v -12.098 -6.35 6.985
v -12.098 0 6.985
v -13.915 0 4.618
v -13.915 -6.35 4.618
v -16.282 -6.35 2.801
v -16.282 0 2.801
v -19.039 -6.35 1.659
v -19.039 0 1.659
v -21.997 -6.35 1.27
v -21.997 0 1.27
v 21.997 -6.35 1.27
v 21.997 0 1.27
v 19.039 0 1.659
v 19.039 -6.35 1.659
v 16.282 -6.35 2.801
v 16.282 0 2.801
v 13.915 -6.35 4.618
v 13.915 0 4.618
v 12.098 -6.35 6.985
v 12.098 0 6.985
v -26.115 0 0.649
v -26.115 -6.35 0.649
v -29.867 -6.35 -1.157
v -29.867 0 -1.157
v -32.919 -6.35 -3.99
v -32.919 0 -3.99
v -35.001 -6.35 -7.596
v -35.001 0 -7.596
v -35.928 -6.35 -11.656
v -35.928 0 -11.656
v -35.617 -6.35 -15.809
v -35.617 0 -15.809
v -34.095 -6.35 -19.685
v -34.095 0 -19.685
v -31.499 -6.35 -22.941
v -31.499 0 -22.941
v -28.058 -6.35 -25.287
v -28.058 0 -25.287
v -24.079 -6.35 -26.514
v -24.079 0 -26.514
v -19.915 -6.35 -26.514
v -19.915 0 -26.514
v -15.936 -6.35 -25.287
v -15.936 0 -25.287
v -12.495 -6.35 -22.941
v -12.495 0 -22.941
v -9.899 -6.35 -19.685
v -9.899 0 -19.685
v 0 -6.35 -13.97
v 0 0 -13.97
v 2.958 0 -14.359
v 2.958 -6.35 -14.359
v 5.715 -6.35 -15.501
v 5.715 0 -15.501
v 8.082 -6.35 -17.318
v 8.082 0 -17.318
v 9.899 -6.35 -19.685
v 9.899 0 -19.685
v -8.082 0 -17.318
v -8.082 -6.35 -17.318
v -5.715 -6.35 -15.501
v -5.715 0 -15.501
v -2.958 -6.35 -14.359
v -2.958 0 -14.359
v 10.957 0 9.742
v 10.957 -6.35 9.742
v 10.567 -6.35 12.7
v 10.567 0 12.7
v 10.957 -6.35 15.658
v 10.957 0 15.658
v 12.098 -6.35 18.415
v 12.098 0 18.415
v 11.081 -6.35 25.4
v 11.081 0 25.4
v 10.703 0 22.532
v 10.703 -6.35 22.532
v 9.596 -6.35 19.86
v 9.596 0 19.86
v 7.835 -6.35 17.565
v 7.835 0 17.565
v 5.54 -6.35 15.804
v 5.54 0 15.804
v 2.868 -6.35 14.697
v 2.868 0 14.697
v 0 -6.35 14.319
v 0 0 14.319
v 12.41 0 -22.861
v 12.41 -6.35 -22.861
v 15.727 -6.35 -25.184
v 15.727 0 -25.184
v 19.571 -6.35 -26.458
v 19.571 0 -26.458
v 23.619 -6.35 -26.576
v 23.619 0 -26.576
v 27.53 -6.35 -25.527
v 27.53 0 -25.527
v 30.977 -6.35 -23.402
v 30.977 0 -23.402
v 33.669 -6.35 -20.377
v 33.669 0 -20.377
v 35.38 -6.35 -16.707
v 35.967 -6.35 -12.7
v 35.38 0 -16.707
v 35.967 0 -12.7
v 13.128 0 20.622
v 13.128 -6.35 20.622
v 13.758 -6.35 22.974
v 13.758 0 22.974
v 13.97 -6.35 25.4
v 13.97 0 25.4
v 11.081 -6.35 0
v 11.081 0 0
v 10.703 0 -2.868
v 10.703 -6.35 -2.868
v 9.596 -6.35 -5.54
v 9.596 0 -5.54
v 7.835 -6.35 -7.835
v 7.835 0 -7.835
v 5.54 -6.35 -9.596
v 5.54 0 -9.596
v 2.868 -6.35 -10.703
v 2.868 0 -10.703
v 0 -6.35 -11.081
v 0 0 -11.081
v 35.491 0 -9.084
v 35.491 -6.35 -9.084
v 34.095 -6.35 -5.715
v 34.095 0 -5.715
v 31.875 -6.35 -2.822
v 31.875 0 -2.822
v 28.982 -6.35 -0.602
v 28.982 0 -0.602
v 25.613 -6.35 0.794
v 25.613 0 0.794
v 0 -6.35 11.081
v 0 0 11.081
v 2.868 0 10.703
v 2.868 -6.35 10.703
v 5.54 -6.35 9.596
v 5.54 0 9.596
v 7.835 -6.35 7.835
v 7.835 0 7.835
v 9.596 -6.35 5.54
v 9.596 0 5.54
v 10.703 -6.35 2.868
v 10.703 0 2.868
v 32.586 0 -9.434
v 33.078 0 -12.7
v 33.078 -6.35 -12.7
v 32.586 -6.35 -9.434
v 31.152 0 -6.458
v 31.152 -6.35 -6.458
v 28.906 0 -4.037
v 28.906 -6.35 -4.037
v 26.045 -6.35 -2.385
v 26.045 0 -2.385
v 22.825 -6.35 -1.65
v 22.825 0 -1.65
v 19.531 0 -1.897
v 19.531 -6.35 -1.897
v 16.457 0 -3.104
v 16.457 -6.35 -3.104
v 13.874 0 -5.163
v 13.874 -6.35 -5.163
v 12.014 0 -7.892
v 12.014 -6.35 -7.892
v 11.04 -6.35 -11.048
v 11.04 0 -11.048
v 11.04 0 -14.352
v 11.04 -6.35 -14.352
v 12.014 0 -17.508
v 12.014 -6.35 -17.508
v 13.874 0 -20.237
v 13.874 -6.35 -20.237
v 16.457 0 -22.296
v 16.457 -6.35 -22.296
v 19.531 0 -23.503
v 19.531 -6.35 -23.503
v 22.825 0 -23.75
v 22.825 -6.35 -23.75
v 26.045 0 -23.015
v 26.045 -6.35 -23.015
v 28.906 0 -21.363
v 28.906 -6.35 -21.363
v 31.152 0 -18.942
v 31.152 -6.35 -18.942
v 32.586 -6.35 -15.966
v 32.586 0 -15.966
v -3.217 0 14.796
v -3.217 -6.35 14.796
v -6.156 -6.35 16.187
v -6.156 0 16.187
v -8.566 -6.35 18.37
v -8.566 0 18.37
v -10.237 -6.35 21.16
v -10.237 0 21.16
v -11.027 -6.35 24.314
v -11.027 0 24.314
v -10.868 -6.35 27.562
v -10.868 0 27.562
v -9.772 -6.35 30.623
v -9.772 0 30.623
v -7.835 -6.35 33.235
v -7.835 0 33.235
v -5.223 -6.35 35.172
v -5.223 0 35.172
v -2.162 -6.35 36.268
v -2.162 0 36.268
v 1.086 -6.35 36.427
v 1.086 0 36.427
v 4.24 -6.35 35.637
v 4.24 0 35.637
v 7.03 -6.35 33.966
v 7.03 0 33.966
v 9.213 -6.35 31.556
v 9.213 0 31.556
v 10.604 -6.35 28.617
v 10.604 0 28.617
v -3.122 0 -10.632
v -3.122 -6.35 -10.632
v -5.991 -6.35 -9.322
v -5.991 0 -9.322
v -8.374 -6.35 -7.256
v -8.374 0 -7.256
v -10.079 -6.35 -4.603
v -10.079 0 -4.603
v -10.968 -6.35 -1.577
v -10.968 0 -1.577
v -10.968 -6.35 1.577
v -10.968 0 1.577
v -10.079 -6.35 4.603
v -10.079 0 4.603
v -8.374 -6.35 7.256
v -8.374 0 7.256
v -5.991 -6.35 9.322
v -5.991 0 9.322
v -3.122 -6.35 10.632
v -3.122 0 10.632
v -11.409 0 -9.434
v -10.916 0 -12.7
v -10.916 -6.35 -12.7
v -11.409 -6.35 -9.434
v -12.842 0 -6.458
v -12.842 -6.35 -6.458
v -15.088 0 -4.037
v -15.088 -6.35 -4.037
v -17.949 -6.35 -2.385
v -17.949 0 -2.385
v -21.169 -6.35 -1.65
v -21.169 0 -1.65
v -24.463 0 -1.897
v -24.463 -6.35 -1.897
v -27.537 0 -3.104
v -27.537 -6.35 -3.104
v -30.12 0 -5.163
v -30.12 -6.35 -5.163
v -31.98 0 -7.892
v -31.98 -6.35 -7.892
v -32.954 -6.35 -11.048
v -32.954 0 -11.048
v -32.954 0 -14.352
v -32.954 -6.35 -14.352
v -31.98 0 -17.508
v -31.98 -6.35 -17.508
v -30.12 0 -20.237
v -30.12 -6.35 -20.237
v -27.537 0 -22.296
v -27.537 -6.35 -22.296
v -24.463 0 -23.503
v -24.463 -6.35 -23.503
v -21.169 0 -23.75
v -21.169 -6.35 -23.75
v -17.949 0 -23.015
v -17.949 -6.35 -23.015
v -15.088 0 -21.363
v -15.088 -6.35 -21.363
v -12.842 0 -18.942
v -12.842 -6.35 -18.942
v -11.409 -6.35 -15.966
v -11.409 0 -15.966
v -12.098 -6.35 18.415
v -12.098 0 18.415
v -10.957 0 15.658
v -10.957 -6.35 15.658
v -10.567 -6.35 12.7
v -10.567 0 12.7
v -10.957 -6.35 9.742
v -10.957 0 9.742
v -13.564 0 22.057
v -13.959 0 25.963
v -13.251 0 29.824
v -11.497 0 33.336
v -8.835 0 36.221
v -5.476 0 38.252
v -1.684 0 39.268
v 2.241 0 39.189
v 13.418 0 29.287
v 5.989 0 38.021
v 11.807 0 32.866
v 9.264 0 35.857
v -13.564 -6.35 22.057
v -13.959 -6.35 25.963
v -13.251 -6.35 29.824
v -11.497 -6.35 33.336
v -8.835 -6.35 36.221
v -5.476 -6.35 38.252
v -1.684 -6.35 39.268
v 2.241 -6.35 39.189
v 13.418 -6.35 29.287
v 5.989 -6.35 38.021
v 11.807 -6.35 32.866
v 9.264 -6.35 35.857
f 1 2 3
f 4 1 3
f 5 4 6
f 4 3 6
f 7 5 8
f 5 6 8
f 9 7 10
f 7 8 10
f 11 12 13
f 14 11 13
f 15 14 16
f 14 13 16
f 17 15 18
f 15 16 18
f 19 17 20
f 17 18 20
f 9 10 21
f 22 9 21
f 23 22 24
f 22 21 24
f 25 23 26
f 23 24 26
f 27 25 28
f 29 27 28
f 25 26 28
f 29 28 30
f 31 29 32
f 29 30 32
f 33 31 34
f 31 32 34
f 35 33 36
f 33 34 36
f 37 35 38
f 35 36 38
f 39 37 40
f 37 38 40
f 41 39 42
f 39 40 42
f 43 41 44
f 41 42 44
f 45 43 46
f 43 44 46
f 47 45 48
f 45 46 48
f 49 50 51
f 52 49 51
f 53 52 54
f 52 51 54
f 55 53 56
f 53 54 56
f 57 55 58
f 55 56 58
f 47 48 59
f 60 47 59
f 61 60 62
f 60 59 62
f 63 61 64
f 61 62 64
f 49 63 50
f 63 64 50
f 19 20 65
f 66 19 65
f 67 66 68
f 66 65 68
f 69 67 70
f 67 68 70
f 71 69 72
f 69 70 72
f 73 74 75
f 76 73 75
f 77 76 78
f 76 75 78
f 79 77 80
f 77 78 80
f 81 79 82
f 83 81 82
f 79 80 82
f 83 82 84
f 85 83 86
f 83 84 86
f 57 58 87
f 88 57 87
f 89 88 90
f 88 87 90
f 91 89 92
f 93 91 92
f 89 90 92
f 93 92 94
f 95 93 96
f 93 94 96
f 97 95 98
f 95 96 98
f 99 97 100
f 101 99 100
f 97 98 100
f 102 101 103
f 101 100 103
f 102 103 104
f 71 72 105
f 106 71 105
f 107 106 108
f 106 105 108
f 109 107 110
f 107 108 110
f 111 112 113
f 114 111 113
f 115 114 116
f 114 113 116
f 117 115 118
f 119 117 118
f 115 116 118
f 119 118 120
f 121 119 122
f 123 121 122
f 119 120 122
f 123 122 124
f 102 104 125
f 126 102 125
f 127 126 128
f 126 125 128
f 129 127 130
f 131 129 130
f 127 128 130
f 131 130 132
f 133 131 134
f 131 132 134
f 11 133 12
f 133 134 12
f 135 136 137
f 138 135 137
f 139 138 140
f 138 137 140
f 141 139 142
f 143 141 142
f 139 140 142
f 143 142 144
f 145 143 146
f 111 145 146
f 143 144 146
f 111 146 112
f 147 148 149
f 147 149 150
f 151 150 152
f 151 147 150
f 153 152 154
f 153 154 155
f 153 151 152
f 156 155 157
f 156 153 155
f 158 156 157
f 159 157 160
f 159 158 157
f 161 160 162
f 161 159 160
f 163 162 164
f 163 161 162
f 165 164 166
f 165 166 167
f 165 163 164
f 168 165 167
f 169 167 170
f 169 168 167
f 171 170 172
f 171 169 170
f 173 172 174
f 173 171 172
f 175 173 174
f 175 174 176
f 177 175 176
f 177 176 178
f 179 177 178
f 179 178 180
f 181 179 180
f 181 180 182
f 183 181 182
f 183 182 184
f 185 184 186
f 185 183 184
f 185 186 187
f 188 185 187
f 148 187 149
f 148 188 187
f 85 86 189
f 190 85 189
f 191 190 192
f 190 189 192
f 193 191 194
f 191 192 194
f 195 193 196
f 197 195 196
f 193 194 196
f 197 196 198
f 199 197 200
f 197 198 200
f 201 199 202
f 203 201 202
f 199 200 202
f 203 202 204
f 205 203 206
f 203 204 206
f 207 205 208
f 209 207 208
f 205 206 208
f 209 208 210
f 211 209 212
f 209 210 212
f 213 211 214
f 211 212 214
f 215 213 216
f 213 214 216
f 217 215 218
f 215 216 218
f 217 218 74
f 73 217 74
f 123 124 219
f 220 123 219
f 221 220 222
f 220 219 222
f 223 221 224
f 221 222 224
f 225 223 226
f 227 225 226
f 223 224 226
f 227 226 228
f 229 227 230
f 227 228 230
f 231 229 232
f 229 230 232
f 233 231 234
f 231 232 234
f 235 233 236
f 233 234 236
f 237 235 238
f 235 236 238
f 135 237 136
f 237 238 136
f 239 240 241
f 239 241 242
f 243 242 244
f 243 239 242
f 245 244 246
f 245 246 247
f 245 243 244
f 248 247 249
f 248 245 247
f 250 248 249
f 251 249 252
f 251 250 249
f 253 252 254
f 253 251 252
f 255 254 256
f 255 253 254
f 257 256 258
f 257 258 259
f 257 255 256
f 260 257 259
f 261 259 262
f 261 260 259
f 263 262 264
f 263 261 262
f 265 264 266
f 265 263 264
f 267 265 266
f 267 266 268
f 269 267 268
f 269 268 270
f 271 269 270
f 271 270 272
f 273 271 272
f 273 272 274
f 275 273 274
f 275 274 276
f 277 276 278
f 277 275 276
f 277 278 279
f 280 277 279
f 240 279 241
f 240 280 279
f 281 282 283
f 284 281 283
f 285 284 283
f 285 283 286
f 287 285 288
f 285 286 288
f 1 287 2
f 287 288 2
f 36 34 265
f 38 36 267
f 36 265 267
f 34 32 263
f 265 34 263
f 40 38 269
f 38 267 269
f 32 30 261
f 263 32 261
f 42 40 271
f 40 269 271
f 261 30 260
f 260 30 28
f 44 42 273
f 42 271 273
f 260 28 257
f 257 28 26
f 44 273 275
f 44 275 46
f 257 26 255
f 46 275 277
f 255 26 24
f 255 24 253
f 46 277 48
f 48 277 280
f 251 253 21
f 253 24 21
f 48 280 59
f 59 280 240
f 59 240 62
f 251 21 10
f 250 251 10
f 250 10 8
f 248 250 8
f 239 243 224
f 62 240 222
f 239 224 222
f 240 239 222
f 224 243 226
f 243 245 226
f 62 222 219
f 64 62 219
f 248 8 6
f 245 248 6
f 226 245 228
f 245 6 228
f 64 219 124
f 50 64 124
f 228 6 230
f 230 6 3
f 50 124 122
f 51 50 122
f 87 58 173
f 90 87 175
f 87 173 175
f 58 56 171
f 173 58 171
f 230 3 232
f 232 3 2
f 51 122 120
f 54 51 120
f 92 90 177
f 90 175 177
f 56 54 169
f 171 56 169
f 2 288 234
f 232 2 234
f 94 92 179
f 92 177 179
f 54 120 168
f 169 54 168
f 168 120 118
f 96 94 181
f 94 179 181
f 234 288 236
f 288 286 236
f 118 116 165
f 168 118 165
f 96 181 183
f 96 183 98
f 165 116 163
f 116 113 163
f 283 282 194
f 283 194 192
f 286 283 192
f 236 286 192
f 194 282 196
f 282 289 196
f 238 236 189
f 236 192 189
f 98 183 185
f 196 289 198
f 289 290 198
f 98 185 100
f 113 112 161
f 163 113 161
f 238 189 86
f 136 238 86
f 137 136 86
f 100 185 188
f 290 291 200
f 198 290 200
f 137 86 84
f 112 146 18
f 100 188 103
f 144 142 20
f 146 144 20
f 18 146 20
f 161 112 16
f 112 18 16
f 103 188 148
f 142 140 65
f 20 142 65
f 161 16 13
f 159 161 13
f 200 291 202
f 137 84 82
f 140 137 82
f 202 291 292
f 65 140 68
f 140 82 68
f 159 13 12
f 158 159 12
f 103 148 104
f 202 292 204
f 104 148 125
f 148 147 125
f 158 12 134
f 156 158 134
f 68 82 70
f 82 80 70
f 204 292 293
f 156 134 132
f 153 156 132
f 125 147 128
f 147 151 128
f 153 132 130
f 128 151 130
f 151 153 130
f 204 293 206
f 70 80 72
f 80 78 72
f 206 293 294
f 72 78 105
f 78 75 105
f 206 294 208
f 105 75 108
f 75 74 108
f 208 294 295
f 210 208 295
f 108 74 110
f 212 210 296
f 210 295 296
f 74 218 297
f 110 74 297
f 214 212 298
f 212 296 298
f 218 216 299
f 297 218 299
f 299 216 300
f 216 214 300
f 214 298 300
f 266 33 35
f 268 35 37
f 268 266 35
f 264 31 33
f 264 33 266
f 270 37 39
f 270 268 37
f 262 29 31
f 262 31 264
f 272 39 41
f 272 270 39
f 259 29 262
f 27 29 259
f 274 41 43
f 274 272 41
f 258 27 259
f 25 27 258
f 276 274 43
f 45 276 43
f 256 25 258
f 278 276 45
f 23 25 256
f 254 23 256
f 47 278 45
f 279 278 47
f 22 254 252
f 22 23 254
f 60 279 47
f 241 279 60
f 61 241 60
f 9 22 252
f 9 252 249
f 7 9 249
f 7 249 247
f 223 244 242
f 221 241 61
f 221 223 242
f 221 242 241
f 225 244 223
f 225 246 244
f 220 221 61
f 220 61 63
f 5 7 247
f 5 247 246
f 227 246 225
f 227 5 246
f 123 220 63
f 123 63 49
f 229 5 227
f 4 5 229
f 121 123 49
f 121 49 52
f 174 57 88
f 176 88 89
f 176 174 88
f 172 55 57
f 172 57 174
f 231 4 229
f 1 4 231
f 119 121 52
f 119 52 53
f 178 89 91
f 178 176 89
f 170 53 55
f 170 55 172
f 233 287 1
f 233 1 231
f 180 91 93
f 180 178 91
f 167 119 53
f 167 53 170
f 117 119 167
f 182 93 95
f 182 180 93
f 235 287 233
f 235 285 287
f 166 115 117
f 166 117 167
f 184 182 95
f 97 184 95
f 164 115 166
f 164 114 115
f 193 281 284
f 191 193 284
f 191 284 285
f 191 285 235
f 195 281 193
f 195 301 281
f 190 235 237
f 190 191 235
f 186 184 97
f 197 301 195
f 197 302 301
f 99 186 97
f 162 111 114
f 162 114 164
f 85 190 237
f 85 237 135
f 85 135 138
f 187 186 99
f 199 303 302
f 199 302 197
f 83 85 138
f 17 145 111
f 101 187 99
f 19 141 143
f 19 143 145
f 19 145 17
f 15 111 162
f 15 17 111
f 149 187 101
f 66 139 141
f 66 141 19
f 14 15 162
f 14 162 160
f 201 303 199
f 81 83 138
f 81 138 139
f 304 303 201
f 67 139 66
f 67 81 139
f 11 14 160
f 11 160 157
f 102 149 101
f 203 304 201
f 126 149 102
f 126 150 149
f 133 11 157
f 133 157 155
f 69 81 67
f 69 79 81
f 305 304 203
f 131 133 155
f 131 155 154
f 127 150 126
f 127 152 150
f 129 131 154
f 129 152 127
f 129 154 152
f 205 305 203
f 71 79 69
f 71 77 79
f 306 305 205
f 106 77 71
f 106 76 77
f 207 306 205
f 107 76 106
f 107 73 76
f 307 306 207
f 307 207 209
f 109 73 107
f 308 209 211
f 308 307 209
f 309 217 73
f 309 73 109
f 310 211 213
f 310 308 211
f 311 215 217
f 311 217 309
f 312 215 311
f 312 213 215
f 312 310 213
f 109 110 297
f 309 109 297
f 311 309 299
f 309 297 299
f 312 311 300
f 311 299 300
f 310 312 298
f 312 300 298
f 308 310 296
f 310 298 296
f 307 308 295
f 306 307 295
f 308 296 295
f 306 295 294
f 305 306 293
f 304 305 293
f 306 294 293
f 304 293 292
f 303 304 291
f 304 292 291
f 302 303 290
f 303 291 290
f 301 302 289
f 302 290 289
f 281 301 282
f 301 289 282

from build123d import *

# Parameters (mm, degrees)
F0_R     = 11.08075
F1_DEPTH = 6.35


with BuildPart() as f1:
    # F0 (on Front) → F1 (new body)
    with BuildSketch(Plane.XZ):
        with BuildLine():
            ThreePointArc((0, -11.08075), (-11.08075, 0), (0, 11.08075))
            Line((0, 11.08075), (0, 11.43))
            ThreePointArc((0, 11.43), (-2.9784140075, 11.7511923598), (-5.8198711326, 12.7))
            ThreePointArc((-5.8198711326, 12.7), (-9.4037860849, 10.3310070791), (-12.0983749873, 6.9849998329))
            ThreePointArc((-12.0983749873, 6.9849998329), (-13.6488076608, 2.9784139133), (-13.9084581944, -1.3098437524))
            ThreePointArc((-13.9084581944, -1.3098437524), (-9.8986703653, -5.715), (-8.0885870618, -11.3901562476))
            ThreePointArc((-8.0885870618, -11.3901562476), (-4.2450216288, -13.3094211509), (-4.4e-09, -13.97))
            Line((0, -13.97), (0, -11.08075))
        make_face()
        with BuildLine():
            ThreePointArc((-13.9084581944, -1.3098437524), (-12.0983748909, -6.985), (-8.0885870618, -11.3901562476))
            ThreePointArc((-8.0885870618, -11.3901562476), (-9.8986703653, -5.715), (-13.9084581944, -1.3098437524))
        make_face()
        with BuildLine():
            ThreePointArc((-8.0270452561, -12.7), (-8.042439189, -12.044355651), (-8.0885870618, -11.3901562476))
            ThreePointArc((-8.0885870618, -11.3901562476), (-12.0983748909, -6.985), (-13.9084581944, -1.3098437524))
            ThreePointArc((-13.9084581944, -1.3098437524), (-17.7520236295, 0.6094211516), (-21.9970452561, 1.27))
            ThreePointArc((-21.9970452561, 1.27), (-34.095420147, -19.685), (-9.8986703653, -19.685))
            ThreePointArc((-9.8986703653, -19.685), (-8.5030614629, -16.3157020601), (-8.0270452561, -12.7))
        make_face()
        with Locations((-21.9970452561, -12.7)):
            Circle(F0_R, mode=Mode.SUBTRACT)
        with BuildLine():
            ThreePointArc((-13.9084581944, -1.3098437524), (-13.6488076608, 2.9784139133), (-12.0983749873, 6.9849998329))
            ThreePointArc((-12.0983749873, 6.9849998329), (-16.2820453397, 2.8013295865), (-21.9970452561, 1.27))
            ThreePointArc((-21.9970452561, 1.27), (-17.7520236295, 0.6094211516), (-13.9084581944, -1.3098437524))
        make_face()
        with BuildLine():
            ThreePointArc((-12.0983749873, 6.9849998329), (-9.4037860849, 10.3310070791), (-5.8198711326, 12.7))
            ThreePointArc((-5.8198711326, 12.7), (-9.4037860136, 15.0689928559), (-12.0983748909, 18.415))
            ThreePointArc((-12.0983748909, 18.415), (-10.5670452561, 12.6999999036), (-12.0983749873, 6.9849998329))
        make_face()
        with BuildLine():
            ThreePointArc((-5.8198711326, 12.7), (-2.9784140075, 13.6488076402), (0, 13.97))
            ThreePointArc((0, 13.97), (2.9784140075, 13.6488076402), (5.8198711326, 12.7))
            ThreePointArc((5.8198711326, 12.7), (9.4037860136, 15.0689928559), (12.0983748909, 18.415))
            ThreePointArc((12.0983748909, 18.415), (13.4939837933, 21.7842979399), (13.97, 25.4))
            ThreePointArc((13.97, 25.4), (-3.6157020601, 38.8939837933), (-12.0983748909, 18.415))
            ThreePointArc((-12.0983748909, 18.415), (-9.4037860136, 15.0689928559), (-5.8198711326, 12.7))
        make_face()
        with BuildLine():
            ThreePointArc((11.08075, 25.4), (7.8352734656, 17.5647265344), (0, 14.31925))
            ThreePointArc((0, 14.31925), (-7.8352734656, 33.2352734656), (11.08075, 25.4))
        make_face(mode=Mode.SUBTRACT)
        with BuildLine():
            ThreePointArc((-5.8198711326, 12.7), (-2.9784140075, 11.7511923598), (0, 11.43))
            Line((0, 11.43), (0, 13.97))
            ThreePointArc((0, 13.97), (-2.9784140075, 13.6488076402), (-5.8198711326, 12.7))
        make_face()
        with BuildLine():
            Line((0, 13.97), (0, 11.43))
            ThreePointArc((0, 11.43), (2.9784140075, 11.7511923598), (5.8198711326, 12.7))
            ThreePointArc((5.8198711326, 12.7), (2.9784140075, 13.6488076402), (0, 13.97))
        make_face()
        with BuildLine():
            ThreePointArc((0, 11.08075), (7.8352734656, 7.8352734656), (11.08075, 0))
            ThreePointArc((11.08075, 0), (7.8352734656, -7.8352734656), (0, -11.08075))
            Line((0, -11.08075), (0, -13.97))
            ThreePointArc((-4.4e-09, -13.97), (4.2450216245, -13.3094211522), (8.0885870618, -11.3901562476))
            ThreePointArc((8.0885870618, -11.3901562476), (9.8986703653, -5.715), (13.9084581944, -1.3098437524))
            ThreePointArc((13.9084581944, -1.3098437524), (13.9546060671, -0.655644349), (13.97, 0))
            ThreePointArc((13.97, 0), (13.4939837983, 3.6157020414), (12.0983749102, 6.9849999665))
            ThreePointArc((12.0983749102, 6.9849999665), (9.4037860279, 10.331007131), (5.8198711326, 12.7))
            ThreePointArc((5.8198711326, 12.7), (2.9784140075, 11.7511923598), (0, 11.43))
            Line((0, 11.43), (0, 11.08075))
        make_face()
        with BuildLine():
            ThreePointArc((12.0983748909, 18.415), (9.4037860136, 15.0689928559), (5.8198711326, 12.7))
            ThreePointArc((5.8198711326, 12.7), (9.4037860279, 10.331007131), (12.0983749102, 6.9849999665))
            ThreePointArc((12.0983749102, 6.9849999665), (10.5670452561, 12.6999999806), (12.0983748909, 18.415))
        make_face()
        with BuildLine():
            ThreePointArc((21.9970452561, 1.27), (16.2820452729, 2.8013296251), (12.0983749102, 6.9849999665))
            ThreePointArc((12.0983749102, 6.9849999665), (13.4939837983, 3.6157020414), (13.97, 0))
            ThreePointArc((13.97, 0), (13.9546060671, -0.655644349), (13.9084581944, -1.3098437524))
            ThreePointArc((13.9084581944, -1.3098437524), (17.7520236295, 0.6094211516), (21.9970452561, 1.27))
        make_face()
        with BuildLine():
            ThreePointArc((13.9084581944, -1.3098437524), (12.0983748909, -6.985), (8.0885870618, -11.3901562476))
            ThreePointArc((8.0885870618, -11.3901562476), (8.3482376159, -15.6784140075), (9.8986703653, -19.685))
            ThreePointArc((9.8986703653, -19.685), (25.6127473162, -26.1939837933), (35.9670452561, -12.7))
            ThreePointArc((35.9670452561, -12.7), (31.8753269893, -2.8217182668), (21.9970452561, 1.27))
            ThreePointArc((21.9970452561, 1.27), (17.7520236295, 0.6094211516), (13.9084581944, -1.3098437524))
        make_face()
        with Locations((21.9970452561, -12.7)):
            Circle(F0_R, mode=Mode.SUBTRACT)
        with BuildLine():
            ThreePointArc((13.9084581944, -1.3098437524), (9.8986703653, -5.715), (8.0885870618, -11.3901562476))
            ThreePointArc((8.0885870618, -11.3901562476), (12.0983748909, -6.985), (13.9084581944, -1.3098437524))
        make_face()
        with BuildLine():
            ThreePointArc((-9.8986703653, -19.685), (-5.7150000019, -15.5013296359), (-4.4e-09, -13.97))
            ThreePointArc((-4.4e-09, -13.97), (-4.2450216288, -13.3094211509), (-8.0885870618, -11.3901562476))
            ThreePointArc((-8.0885870618, -11.3901562476), (-8.042439189, -12.044355651), (-8.0270452561, -12.7))
            ThreePointArc((-8.0270452561, -12.7), (-8.5030614629, -16.3157020601), (-9.8986703653, -19.685))
        make_face()
        with BuildLine():
            ThreePointArc((8.0885870618, -11.3901562476), (4.2450216245, -13.3094211522), (-4.4e-09, -13.97))
            ThreePointArc((-4.4e-09, -13.97), (5.7149999981, -15.5013296336), (9.8986703653, -19.685))
            ThreePointArc((9.8986703653, -19.685), (8.3482376159, -15.6784140075), (8.0885870618, -11.3901562476))
        make_face()
    extrude(amount=F1_DEPTH)


solid = f1.part
